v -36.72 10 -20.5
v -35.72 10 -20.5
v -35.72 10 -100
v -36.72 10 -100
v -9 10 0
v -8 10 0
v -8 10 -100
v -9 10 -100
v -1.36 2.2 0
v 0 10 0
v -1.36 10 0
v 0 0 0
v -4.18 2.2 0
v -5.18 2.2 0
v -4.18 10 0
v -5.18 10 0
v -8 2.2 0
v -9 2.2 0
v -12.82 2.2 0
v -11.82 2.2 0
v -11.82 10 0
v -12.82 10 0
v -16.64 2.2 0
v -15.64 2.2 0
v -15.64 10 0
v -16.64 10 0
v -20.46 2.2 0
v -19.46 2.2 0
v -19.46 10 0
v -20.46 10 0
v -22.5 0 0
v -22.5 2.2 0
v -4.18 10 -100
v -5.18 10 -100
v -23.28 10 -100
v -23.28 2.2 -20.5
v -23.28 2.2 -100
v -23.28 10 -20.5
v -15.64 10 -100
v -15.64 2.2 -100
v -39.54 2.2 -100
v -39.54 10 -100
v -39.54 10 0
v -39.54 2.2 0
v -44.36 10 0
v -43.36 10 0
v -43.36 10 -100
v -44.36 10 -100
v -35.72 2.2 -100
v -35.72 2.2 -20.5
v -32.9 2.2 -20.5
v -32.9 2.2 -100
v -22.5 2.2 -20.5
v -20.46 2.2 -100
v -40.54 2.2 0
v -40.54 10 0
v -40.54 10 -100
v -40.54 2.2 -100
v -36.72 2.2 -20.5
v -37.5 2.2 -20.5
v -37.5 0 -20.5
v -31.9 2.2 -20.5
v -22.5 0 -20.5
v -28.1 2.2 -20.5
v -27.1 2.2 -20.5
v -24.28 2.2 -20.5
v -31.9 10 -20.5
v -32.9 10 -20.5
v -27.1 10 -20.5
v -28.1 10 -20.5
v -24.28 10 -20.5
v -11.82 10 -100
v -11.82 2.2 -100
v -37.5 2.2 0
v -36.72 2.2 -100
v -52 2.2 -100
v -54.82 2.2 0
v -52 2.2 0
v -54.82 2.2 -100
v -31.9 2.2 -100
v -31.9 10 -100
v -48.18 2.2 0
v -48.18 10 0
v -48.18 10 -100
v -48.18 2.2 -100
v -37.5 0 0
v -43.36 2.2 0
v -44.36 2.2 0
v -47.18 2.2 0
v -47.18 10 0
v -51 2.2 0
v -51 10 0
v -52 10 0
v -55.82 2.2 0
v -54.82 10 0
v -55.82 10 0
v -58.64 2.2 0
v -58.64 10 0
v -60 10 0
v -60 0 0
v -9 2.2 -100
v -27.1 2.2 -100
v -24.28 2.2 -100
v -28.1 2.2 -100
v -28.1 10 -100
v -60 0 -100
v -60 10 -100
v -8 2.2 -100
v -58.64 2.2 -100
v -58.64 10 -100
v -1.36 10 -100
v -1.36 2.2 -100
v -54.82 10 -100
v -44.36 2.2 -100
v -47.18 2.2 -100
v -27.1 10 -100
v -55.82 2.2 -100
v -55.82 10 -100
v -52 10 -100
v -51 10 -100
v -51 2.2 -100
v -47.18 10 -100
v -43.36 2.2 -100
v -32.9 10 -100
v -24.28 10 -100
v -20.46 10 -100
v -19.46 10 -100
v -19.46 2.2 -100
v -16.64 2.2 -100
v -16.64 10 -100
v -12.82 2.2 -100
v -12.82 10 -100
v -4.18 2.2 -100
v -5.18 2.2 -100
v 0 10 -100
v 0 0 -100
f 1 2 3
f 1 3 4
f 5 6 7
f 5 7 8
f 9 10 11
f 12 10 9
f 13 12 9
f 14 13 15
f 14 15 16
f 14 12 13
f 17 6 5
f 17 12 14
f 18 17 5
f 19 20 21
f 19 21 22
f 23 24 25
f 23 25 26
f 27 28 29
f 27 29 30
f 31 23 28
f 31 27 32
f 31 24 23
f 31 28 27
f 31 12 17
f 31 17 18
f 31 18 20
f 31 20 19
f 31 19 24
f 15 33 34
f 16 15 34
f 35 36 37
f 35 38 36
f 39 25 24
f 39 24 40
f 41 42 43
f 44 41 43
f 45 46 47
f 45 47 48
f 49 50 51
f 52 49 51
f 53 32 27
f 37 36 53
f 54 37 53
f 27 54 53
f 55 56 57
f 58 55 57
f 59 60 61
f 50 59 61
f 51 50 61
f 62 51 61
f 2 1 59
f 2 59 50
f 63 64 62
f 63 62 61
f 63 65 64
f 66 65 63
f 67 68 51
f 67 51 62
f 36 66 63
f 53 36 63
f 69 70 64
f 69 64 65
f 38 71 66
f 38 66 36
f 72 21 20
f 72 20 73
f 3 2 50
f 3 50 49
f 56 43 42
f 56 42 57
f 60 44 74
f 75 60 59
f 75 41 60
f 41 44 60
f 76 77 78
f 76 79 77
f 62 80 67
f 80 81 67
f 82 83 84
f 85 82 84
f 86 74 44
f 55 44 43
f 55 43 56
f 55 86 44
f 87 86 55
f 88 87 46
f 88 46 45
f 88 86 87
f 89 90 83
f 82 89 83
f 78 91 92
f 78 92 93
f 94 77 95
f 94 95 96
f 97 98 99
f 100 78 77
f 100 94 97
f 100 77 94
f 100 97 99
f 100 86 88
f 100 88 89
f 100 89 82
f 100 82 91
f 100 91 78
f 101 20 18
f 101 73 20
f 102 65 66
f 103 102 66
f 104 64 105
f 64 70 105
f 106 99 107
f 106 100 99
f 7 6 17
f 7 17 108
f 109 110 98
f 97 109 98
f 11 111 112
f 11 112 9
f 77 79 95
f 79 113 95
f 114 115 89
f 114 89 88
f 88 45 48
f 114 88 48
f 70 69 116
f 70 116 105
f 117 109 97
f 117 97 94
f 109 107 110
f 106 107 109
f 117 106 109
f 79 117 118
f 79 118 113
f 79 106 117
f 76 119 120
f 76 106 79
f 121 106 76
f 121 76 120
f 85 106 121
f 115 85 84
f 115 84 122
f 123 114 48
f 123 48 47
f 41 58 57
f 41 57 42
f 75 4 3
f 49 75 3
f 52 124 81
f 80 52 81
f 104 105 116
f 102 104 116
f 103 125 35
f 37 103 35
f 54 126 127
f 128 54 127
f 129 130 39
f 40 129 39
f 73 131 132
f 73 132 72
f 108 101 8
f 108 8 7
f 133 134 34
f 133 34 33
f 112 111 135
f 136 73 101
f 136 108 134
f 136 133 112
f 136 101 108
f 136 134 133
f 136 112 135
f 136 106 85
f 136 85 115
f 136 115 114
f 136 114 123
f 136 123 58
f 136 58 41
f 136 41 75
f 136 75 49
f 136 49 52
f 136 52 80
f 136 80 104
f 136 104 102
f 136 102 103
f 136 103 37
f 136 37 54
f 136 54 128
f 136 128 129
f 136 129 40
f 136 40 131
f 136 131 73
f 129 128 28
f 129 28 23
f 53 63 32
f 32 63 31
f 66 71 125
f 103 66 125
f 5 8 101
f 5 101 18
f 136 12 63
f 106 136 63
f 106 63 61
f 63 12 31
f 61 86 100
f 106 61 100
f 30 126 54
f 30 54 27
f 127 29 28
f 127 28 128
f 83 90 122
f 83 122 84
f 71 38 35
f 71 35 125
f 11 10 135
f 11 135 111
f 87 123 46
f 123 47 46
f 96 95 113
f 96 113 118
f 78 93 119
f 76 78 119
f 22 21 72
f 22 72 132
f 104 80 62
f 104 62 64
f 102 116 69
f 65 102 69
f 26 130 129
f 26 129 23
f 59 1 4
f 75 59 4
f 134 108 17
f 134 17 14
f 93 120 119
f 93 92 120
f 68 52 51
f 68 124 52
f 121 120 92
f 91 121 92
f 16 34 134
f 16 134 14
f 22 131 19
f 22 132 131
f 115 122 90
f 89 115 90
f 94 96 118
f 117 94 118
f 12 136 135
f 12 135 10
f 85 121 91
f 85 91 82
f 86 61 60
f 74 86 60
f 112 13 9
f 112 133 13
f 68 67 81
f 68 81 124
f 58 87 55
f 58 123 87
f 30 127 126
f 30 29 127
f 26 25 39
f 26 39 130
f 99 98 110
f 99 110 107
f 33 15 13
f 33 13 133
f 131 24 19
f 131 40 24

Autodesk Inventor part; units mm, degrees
ref_plane "YZ Plane" through (0, 0, 0) normal (1, 0, 0) x (0, 1, 0)
ref_plane "XZ Plane" through (0, 0, 0) normal (0, 1, 0) x (-1, 0, 0)
ref_plane "XY Plane" through (0, 0, 0) normal (0, 0, 1) x (1, 0, 0)
sketch "Sketch1" plane through (0, 0, 0) normal (0, 1, 0) x (-1, 0, 0)
  line L0 (0, 0) -> (60, 0)
  line L1 (60, 0) -> (60, -100)
  line L2 (60, -100) -> (0, -100)
  line L3 (0, -100) -> (0, 0)
  dimension "d0" = 60
  dimension "d1" = 100
extrude "Extrusion1" add sketch "Sketch1" along normal blind 10
sketch "Sketch2" plane through (0, 10, 0) normal (0, 1, 0) x (1, 0, 0)
  line L0 (-60, 0) -> (0, 0) projected
  line L1 (-30, 0) -> (-30, 100)
  line L2 (0, 100) -> (-60, 100) projected
  line L3 (-31.9, 0) -> (-28.1, 0)
  line L4 (-28.1, 0) -> (-28.1, 100)
  line L5 (-28.1, 100) -> (-31.9, 100)
  line L6 (-31.9, 100) -> (-31.9, 0)
  line L7 (-31.9, 0) -> (-28.1, 100) construction
  line L8 (-28.1, 0) -> (-31.9, 100) construction
  line L9 (-32.9, 0) -> (-35.72, 0)
  line L10 (-35.72, 0) -> (-35.72, 100)
  line L11 (-35.72, 100) -> (-32.9, 100)
  line L12 (-32.9, 100) -> (-32.9, 0)
  line L13 (-32.9, 0) -> (-35.72, 100) construction
  line L14 (-35.72, 0) -> (-32.9, 100) construction
  line L15 (-39.54, 0) -> (-36.72, 0)
  line L16 (-36.72, 0) -> (-36.72, 100)
  line L17 (-36.72, 100) -> (-39.54, 100)
  line L18 (-39.54, 100) -> (-39.54, 0)
  line L19 (-39.54, 0) -> (-36.72, 100) construction
  line L20 (-36.72, 0) -> (-39.54, 100) construction
  line L21 (-43.36, 0) -> (-40.54, 0)
  line L22 (-40.54, 0) -> (-40.54, 100)
  line L23 (-40.54, 100) -> (-43.36, 100)
  line L24 (-43.36, 100) -> (-43.36, 0)
  line L25 (-43.36, 0) -> (-40.54, 100) construction
  line L26 (-40.54, 0) -> (-43.36, 100) construction
  line L27 (-47.18, 0) -> (-44.36, 0)
  line L28 (-44.36, 0) -> (-44.36, 100)
  line L29 (-44.36, 100) -> (-47.18, 100)
  line L30 (-47.18, 100) -> (-47.18, 0)
  line L31 (-47.18, 0) -> (-44.36, 100) construction
  line L32 (-44.36, 0) -> (-47.18, 100) construction
  line L33 (-51, 0) -> (-48.18, 0)
  line L34 (-48.18, 0) -> (-48.18, 100)
  line L35 (-48.18, 100) -> (-51, 100)
  line L36 (-51, 100) -> (-51, 0)
  line L37 (-51, 0) -> (-48.18, 100) construction
  line L38 (-48.18, 0) -> (-51, 100) construction
  line L39 (-54.82, 0) -> (-52, 0)
  line L40 (-52, 0) -> (-52, 100)
  line L41 (-52, 100) -> (-54.82, 100)
  line L42 (-54.82, 100) -> (-54.82, 0)
  line L43 (-54.82, 0) -> (-52, 100) construction
  line L44 (-52, 0) -> (-54.82, 100) construction
  line L45 (-58.64, 0) -> (-55.82, 0)
  line L46 (-55.82, 0) -> (-55.82, 100)
  line L47 (-55.82, 100) -> (-58.64, 100)
  line L48 (-58.64, 100) -> (-58.64, 0)
  line L49 (-58.64, 0) -> (-55.82, 100) construction
  line L50 (-55.82, 0) -> (-58.64, 100) construction
  line L51 (-31.9, 0) -> (-31.9, 100)
  line L52 (-28.1, 100) -> (-28.1, 0)
  line L53 (-28.1, 0) -> (-31.9, 100) construction
  line L54 (-31.9, 0) -> (-28.1, 100) construction
  line L55 (-24.28, 0) -> (-24.28, 100)
  line L56 (-27.1, 100) -> (-27.1, 0)
  line L57 (-27.1, 0) -> (-24.28, 100) construction
  line L58 (-24.28, 0) -> (-27.1, 100) construction
  line L59 (-23.28, 0) -> (-23.28, 100)
  line L60 (-20.46, 100) -> (-20.46, 0)
  line L61 (-20.46, 0) -> (-23.28, 100) construction
  line L62 (-23.28, 0) -> (-20.46, 100) construction
  line L63 (-19.46, 0) -> (-19.46, 100)
  line L64 (-16.64, 100) -> (-16.64, 0)
  line L65 (-16.64, 0) -> (-19.46, 100) construction
  line L66 (-19.46, 0) -> (-16.64, 100) construction
  line L67 (-15.64, 0) -> (-15.64, 100)
  line L68 (-12.82, 100) -> (-12.82, 0)
  line L69 (-12.82, 0) -> (-15.64, 100) construction
  line L70 (-15.64, 0) -> (-12.82, 100) construction
  line L71 (-11.82, 0) -> (-11.82, 100)
  line L72 (-9, 100) -> (-9, 0)
  line L73 (-9, 0) -> (-11.82, 100) construction
  line L74 (-11.82, 0) -> (-9, 100) construction
  line L75 (-8, 0) -> (-8, 100)
  line L76 (-5.18, 100) -> (-5.18, 0)
  line L77 (-5.18, 0) -> (-8, 100) construction
  line L78 (-8, 0) -> (-5.18, 100) construction
  line L79 (-4.18, 0) -> (-4.18, 100)
  line L80 (-1.36, 100) -> (-1.36, 0)
  line L81 (-1.36, 0) -> (-4.18, 100) construction
  line L82 (-4.18, 0) -> (-1.36, 100) construction
  line L83 (-60, 100) -> (-60, 0) projected
  point P0 (-30, 50)
  point P1 (-34.31, 50)
  point P2 (-38.13, 50)
  point P3 (-41.95, 50)
  point P4 (-45.77, 50)
  point P5 (-49.59, 50)
  point P6 (-53.41, 50)
  point P7 (-57.23, 50)
  point P8 (-25.69, 50)
  point P9 (-21.87, 50)
  point P10 (-18.05, 50)
  point P11 (-14.23, 50)
  point P12 (-10.41, 50)
  point P13 (-6.59, 50)
  point P14 (-2.77, 50)
  point P15 (-1.36, 0)
  point P16 (-1.36, 100)
  point P17 (-4.18, 100)
  point P18 (-4.18, 0)
  point P19 (-5.18, 0)
  point P20 (-5.18, 100)
  point P21 (-8, 100)
  point P22 (-8, 0)
  point P23 (-9, 0)
  point P24 (-9, 100)
  point P25 (-11.82, 100)
  point P26 (-11.82, 0)
  point P27 (-12.82, 0)
  point P28 (-12.82, 100)
  point P29 (-15.64, 100)
  point P30 (-15.64, 0)
  point P31 (-16.64, 0)
  point P32 (-16.64, 100)
  point P33 (-19.46, 100)
  point P34 (-19.46, 0)
  point P35 (-23.28, 0)
  point P36 (-20.46, 0)
  point P37 (-27.1, 0)
  point P38 (-24.28, 0)
  point P39 (-31.9, 0)
  point P40 (-28.1, 0)
  point P41 (-32.9, 0)
  point P42 (-35.72, 0)
  point P43 (-39.54, 0)
  point P44 (-36.72, 0)
  point P45 (-43.36, 0)
  point P46 (-40.54, 0)
  point P47 (-47.18, 0)
  point P48 (-44.36, 0)
  point P49 (-51, 0)
  point P50 (-48.18, 0)
  point P51 (-54.82, 100)
  point P52 (-54.82, 0)
  point P53 (-52, 0)
  point P54 (-52, 100)
  point P55 (-58.64, 100)
  point P56 (-58.64, 0)
  point P57 (-55.82, 0)
  point P58 (-55.82, 100)
  dimension "d4" = 3.8
  dimension "d5" = 100
  dimension "d6" = 2.82
  dimension "d7" = 1
  dimension "d8" = 100
  dimension "d9" = 2.82
  dimension "d10" = 1
  dimension "d11" = 2.82
  dimension "d12" = 1
  dimension "d13" = 2.82
  dimension "d14" = 100
  dimension "d15" = 1
  dimension "d16" = 2.82
  dimension "d17" = 100
  dimension "d18" = 1
  dimension "d19" = 2.82
  dimension "d20" = 100
  dimension "d21" = 1
  dimension "d22" = 2.82
  dimension "d23" = 100
  dimension "d24" = 1
  dimension "d27" = 1.36
  dimension "d28" = 0
  dimension "d29" = 0
  dimension "d30" = 100
  dimension "d31" = 100
extrude "Extrusion2" cut sketch "Sketch2" against normal blind 7.8 contours L48 L2 L46 L0 | L42 L2 L40 L0 | L36 L2 L34 L0 | L30 L2 L28 L0 | L24 L2 L22 L0 | L18 L2 L16 L0 | L10 L2 L12 L0 | L6 L2 L1 L0 | L1 L2 L4 L0 | L56 L2 L55 L0 | L59 L2 L60 L0 | L63 L2 L64 L0 | L67 L2 L68 L0 | L71 L2 L72 L0 | L75 L2 L76 L0 | L79 L2 L80 L0
sketch "Sketch3" plane through (0, 0, 0) normal (0, -1, 0) x (1, 0, 0)
  line L0 (-12.82, 0) -> (-11.82, 0) projected
  line L1 (-22.5, 0) -> (-37.5, 0)
  line L2 (-37.5, 0) -> (-37.5, -15.5)
  line L3 (-37.5, -15.5) -> (-22.5, -15.5)
  line L4 (-22.5, -15.5) -> (-22.5, 0)
  line L5 (0, 0) -> (0, -100) projected
  dimension "d32" = 15
  dimension "d33" = 15.5
  dimension "d34" = 22.5
extrude "Extrusion3" cut sketch "Sketch3" against normal blind 31.5
sketch "Sketch4" plane through (-37.5, 0, -15.5) normal (0, 0, 1) x (1, 0, 0)
  line L0 (0, -3.5749) -> (15, -3.5749)
  line L1 (15, -3.5749) -> (15, 11.2742)
  line L2 (15, 11.2742) -> (0, 11.2742)
  line L3 (0, 11.2742) -> (0, -3.5749)
  line L4 (0, 0) -> (0, 2.2) projected
  line L5 (15, 0) -> (15, 2.2) projected
  point P0 (37.5, 0)
  dimension "d37" = 0
  dimension "d38" = 0
extrude "Extrusion4" cut sketch "Sketch4" against normal blind 5
properties part number "heatsink" material "Aluminum 6061"
